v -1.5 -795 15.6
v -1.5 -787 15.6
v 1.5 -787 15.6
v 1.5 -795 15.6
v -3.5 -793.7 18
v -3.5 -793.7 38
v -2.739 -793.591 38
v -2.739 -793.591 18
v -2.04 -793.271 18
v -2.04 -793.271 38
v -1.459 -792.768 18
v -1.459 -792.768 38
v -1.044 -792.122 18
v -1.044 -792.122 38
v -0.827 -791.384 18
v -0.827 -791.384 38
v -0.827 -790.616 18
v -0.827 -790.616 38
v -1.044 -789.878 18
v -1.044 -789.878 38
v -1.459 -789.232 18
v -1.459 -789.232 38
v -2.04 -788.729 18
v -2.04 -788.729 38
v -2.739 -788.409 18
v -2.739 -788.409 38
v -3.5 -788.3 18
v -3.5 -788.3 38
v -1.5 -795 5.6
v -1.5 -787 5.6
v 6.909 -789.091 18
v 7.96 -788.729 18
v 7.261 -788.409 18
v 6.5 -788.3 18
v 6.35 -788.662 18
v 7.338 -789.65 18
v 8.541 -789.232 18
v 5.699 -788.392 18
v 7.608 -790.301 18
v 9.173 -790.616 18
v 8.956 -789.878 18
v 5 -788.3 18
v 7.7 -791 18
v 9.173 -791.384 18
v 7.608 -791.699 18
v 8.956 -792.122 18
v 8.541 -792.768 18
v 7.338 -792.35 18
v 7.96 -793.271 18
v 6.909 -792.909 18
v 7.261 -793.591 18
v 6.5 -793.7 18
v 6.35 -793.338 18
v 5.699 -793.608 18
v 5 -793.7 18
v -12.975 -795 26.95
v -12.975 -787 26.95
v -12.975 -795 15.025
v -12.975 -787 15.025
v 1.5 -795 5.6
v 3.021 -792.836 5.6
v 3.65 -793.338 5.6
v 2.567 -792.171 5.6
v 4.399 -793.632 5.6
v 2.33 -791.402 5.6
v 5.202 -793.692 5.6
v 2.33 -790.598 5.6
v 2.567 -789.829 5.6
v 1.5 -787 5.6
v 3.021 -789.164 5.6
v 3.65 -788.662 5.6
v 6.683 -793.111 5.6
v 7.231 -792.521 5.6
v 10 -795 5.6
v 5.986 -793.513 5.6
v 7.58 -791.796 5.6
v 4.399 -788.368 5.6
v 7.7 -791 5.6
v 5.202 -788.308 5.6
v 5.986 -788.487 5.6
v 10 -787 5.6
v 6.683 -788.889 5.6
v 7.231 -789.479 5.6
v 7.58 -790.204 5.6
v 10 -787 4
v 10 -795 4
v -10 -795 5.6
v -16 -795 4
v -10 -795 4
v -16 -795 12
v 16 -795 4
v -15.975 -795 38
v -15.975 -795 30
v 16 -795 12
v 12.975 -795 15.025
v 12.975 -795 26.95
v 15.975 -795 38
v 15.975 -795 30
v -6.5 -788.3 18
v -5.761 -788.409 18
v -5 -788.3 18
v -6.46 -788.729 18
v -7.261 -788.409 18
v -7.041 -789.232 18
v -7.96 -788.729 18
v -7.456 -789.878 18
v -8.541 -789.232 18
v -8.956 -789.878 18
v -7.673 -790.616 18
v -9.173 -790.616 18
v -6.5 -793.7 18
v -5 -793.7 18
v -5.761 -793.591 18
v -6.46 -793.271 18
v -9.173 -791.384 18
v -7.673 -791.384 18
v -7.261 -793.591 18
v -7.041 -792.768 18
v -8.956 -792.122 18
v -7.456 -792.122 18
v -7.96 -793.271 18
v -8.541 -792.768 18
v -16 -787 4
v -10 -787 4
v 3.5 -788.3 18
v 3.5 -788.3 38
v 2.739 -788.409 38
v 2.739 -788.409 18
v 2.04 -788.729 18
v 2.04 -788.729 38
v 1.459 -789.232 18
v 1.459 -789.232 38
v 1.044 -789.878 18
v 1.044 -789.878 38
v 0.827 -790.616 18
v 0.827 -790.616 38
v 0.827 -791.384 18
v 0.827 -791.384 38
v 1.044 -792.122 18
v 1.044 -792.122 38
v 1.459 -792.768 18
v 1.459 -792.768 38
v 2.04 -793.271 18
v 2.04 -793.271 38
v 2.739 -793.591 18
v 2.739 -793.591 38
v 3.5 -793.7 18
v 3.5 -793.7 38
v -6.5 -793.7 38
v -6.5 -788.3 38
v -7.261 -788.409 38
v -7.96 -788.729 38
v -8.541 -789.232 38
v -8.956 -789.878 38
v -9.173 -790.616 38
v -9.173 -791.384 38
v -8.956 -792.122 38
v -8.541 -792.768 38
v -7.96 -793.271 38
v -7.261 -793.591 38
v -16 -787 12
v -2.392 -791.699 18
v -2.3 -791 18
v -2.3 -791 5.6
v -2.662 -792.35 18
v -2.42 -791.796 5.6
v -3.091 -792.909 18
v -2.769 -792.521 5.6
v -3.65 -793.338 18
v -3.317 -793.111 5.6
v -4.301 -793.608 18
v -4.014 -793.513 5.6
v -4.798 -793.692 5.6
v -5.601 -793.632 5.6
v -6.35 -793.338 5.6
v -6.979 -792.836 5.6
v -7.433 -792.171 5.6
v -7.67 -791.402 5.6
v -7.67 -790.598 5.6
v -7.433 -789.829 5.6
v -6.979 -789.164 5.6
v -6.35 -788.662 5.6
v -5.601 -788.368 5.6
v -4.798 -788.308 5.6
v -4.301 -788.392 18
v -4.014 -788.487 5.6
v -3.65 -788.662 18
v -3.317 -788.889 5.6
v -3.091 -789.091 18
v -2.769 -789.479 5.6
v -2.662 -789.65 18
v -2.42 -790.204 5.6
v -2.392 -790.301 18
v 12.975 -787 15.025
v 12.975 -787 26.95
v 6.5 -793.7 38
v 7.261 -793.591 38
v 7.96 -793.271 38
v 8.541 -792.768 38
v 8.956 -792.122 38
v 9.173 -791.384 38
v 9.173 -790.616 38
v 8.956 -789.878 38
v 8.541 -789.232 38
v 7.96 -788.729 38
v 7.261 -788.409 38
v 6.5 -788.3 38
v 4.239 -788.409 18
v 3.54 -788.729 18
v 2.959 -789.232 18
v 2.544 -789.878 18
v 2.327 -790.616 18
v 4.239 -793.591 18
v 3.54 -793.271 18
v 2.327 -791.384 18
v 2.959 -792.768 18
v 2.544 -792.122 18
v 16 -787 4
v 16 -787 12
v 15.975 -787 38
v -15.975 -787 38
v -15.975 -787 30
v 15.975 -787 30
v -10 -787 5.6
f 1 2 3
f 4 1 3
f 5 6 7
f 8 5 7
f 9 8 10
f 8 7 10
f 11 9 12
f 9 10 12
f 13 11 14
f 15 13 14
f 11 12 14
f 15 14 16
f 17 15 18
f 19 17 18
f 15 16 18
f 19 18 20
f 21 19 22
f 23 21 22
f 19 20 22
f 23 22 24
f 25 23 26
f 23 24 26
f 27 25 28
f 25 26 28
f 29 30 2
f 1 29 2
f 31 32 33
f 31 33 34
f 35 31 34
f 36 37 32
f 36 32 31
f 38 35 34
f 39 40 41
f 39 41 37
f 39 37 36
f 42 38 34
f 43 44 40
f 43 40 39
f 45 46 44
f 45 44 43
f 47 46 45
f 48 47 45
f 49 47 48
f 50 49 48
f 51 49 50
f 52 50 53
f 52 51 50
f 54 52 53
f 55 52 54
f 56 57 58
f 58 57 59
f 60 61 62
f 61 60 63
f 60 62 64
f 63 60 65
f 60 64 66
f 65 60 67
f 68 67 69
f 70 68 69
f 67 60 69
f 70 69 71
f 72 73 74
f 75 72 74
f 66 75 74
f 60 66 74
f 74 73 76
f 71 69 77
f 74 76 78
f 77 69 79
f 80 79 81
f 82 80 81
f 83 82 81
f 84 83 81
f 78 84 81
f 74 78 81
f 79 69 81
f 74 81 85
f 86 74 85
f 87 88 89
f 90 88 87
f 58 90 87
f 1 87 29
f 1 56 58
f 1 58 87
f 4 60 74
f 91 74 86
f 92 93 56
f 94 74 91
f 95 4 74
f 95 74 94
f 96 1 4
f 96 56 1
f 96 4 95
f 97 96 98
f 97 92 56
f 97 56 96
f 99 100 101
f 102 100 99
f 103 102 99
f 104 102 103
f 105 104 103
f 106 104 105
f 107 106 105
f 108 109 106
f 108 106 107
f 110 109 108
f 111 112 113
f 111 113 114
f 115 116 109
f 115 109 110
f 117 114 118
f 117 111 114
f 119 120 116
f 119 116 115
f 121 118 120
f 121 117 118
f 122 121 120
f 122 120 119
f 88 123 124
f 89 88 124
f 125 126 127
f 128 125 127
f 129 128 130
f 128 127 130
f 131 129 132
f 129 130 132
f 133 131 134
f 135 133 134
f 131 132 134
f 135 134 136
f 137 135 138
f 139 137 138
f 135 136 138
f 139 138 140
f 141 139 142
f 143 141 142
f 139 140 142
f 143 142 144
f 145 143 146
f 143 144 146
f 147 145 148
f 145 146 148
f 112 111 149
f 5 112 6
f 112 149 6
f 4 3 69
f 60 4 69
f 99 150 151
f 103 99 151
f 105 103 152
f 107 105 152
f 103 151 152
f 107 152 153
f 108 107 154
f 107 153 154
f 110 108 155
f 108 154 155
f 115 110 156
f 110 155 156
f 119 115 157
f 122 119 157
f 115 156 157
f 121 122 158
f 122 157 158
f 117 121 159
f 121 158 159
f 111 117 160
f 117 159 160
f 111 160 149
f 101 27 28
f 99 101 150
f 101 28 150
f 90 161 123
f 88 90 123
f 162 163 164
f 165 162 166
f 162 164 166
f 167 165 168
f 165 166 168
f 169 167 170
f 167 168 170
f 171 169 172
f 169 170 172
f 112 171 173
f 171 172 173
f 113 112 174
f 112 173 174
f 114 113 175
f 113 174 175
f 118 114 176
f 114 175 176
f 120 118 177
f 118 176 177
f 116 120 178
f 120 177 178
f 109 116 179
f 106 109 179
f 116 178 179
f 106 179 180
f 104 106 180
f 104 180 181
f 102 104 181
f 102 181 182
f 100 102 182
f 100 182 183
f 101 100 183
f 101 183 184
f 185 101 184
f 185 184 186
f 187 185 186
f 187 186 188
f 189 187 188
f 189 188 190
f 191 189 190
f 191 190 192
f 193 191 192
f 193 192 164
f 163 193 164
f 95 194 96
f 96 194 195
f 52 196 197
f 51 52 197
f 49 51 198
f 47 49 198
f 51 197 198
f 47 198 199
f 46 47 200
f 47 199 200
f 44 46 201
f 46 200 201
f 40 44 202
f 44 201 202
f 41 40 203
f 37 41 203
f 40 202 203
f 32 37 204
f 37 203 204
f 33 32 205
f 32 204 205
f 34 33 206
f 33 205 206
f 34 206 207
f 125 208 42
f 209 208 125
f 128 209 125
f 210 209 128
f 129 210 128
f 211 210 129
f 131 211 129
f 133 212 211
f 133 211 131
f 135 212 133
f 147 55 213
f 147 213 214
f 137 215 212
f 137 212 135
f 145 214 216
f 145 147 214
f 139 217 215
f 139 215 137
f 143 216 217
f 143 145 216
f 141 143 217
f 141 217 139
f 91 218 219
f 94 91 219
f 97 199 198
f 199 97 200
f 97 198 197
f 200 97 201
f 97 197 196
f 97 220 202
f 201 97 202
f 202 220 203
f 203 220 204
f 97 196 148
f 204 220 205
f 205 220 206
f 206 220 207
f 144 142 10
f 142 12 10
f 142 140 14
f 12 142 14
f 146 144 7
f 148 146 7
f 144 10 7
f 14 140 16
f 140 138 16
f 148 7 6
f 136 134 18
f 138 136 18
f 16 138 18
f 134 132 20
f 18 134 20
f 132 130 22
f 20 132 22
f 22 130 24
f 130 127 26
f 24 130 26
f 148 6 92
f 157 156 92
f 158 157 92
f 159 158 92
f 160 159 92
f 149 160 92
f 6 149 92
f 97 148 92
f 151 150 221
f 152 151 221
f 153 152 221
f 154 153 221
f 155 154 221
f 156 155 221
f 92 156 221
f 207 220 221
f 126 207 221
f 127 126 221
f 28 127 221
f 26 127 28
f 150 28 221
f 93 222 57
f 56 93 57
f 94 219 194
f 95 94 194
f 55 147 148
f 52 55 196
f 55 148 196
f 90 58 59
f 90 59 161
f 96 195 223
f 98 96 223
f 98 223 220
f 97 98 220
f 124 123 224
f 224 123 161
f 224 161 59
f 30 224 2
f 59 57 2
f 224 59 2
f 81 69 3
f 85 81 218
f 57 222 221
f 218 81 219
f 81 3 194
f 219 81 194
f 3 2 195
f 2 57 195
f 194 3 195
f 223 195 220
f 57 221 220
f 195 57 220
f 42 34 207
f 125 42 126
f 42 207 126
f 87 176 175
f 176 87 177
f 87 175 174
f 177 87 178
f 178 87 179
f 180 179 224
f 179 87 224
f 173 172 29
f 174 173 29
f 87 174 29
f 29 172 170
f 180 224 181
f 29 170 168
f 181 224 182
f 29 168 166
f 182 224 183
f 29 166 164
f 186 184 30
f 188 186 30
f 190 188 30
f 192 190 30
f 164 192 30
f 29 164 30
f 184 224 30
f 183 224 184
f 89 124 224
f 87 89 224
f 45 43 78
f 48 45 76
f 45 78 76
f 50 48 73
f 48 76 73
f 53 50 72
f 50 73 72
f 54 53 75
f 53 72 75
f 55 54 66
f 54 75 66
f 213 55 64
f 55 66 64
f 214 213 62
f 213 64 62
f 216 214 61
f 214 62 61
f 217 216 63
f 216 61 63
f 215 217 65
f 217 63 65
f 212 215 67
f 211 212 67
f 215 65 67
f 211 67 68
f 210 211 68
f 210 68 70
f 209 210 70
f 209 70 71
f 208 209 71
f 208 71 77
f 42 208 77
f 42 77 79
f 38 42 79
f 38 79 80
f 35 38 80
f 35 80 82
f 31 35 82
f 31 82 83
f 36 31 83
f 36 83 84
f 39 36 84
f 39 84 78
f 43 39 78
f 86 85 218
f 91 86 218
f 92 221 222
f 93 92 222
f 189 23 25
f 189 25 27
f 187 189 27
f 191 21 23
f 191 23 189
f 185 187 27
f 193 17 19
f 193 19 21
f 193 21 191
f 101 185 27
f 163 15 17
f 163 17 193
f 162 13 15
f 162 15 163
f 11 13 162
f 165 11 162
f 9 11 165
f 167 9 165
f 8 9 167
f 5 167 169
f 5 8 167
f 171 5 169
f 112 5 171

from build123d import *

# Parameters (mm, degrees)
PAD016_DEPTH    = 8
SKETCH023_R     = 2.5
POCKET005_DEPTH = 2
SKETCH024_R     = 2.7
POCKET006_DEPTH = 32.401
POCKET007_DEPTH = 20


with BuildPart() as part:
    # Sketch022 → Pad016 (new body)
    with BuildSketch(Plane.XZ):
        Polygon((-16, 4), (-10, 4), (-10, 5.6), (-1.5, 5.6), (-1.5, 15.6), (1.5, 15.6), (1.5, 5.6), (10, 5.6), (10, 4), (16, 4), (16, 12), (12.975, 15.025), (12.975, 26.950205), (15.975, 30), (15.975, 38), (-15.975, 38), (-15.975, 30), (-12.975, 26.950205), (-12.975, 15.025), (-16, 12), align=None)
    extrude(amount=PAD016_DEPTH)

    # Sketch023 (on Face7 of Pad016) → Pocket005 (cut)
    with BuildSketch(Plane(origin=(0, 0, 5.6), x_dir=(1, 0, 0), z_dir=(0, 0, -1))):
        with Locations((-5, 4)):
            Circle(SKETCH023_R)
        with Locations((5, 4)):
            Circle(SKETCH023_R)
    extrude(amount=-POCKET005_DEPTH, mode=Mode.SUBTRACT)

    # Sketch024 (on Face11 of Pocket005) → Pocket006 (cut, through all)
    with BuildSketch(Plane(origin=(0, 0, 5.6), x_dir=(1, 0, 0), z_dir=(0, 0, -1))):
        with Locations((-5, 4)):
            Circle(SKETCH024_R)
        with Locations((5, 4)):
            Circle(SKETCH024_R)
    extrude(amount=-POCKET006_DEPTH, mode=Mode.SUBTRACT)

    # Sketch025 (on Face19 of Pocket006) → Pocket007 (cut)
    with BuildSketch(Plane(origin=(0, 0, 38), x_dir=(-1, 0, 0), z_dir=(0, 0, 1))):
        with BuildLine():
            ThreePointArc((-6.5, 6.7), (-9.2, 4), (-6.5, 1.3))
            Line((-6.5, 1.3), (-3.5, 1.3))
            ThreePointArc((-3.5, 1.3), (-0.8, 4), (-3.5, 6.7))
            Line((-3.5, 6.7), (-6.5, 6.7))
        make_face()
        with BuildLine():
            ThreePointArc((3.5, 6.7), (0.8, 4), (3.5, 1.3))
            Line((3.5, 1.3), (6.5, 1.3))
            ThreePointArc((6.5, 1.3), (9.2, 4), (6.5, 6.7))
            Line((6.5, 6.7), (3.5, 6.7))
        make_face()
    extrude(amount=-POCKET007_DEPTH, mode=Mode.SUBTRACT)


with BuildPart() as part_1:
    # Body010 placement: moved
    add(part.part.moved(Location((0, -787, 0))))


solid = part_1.part
